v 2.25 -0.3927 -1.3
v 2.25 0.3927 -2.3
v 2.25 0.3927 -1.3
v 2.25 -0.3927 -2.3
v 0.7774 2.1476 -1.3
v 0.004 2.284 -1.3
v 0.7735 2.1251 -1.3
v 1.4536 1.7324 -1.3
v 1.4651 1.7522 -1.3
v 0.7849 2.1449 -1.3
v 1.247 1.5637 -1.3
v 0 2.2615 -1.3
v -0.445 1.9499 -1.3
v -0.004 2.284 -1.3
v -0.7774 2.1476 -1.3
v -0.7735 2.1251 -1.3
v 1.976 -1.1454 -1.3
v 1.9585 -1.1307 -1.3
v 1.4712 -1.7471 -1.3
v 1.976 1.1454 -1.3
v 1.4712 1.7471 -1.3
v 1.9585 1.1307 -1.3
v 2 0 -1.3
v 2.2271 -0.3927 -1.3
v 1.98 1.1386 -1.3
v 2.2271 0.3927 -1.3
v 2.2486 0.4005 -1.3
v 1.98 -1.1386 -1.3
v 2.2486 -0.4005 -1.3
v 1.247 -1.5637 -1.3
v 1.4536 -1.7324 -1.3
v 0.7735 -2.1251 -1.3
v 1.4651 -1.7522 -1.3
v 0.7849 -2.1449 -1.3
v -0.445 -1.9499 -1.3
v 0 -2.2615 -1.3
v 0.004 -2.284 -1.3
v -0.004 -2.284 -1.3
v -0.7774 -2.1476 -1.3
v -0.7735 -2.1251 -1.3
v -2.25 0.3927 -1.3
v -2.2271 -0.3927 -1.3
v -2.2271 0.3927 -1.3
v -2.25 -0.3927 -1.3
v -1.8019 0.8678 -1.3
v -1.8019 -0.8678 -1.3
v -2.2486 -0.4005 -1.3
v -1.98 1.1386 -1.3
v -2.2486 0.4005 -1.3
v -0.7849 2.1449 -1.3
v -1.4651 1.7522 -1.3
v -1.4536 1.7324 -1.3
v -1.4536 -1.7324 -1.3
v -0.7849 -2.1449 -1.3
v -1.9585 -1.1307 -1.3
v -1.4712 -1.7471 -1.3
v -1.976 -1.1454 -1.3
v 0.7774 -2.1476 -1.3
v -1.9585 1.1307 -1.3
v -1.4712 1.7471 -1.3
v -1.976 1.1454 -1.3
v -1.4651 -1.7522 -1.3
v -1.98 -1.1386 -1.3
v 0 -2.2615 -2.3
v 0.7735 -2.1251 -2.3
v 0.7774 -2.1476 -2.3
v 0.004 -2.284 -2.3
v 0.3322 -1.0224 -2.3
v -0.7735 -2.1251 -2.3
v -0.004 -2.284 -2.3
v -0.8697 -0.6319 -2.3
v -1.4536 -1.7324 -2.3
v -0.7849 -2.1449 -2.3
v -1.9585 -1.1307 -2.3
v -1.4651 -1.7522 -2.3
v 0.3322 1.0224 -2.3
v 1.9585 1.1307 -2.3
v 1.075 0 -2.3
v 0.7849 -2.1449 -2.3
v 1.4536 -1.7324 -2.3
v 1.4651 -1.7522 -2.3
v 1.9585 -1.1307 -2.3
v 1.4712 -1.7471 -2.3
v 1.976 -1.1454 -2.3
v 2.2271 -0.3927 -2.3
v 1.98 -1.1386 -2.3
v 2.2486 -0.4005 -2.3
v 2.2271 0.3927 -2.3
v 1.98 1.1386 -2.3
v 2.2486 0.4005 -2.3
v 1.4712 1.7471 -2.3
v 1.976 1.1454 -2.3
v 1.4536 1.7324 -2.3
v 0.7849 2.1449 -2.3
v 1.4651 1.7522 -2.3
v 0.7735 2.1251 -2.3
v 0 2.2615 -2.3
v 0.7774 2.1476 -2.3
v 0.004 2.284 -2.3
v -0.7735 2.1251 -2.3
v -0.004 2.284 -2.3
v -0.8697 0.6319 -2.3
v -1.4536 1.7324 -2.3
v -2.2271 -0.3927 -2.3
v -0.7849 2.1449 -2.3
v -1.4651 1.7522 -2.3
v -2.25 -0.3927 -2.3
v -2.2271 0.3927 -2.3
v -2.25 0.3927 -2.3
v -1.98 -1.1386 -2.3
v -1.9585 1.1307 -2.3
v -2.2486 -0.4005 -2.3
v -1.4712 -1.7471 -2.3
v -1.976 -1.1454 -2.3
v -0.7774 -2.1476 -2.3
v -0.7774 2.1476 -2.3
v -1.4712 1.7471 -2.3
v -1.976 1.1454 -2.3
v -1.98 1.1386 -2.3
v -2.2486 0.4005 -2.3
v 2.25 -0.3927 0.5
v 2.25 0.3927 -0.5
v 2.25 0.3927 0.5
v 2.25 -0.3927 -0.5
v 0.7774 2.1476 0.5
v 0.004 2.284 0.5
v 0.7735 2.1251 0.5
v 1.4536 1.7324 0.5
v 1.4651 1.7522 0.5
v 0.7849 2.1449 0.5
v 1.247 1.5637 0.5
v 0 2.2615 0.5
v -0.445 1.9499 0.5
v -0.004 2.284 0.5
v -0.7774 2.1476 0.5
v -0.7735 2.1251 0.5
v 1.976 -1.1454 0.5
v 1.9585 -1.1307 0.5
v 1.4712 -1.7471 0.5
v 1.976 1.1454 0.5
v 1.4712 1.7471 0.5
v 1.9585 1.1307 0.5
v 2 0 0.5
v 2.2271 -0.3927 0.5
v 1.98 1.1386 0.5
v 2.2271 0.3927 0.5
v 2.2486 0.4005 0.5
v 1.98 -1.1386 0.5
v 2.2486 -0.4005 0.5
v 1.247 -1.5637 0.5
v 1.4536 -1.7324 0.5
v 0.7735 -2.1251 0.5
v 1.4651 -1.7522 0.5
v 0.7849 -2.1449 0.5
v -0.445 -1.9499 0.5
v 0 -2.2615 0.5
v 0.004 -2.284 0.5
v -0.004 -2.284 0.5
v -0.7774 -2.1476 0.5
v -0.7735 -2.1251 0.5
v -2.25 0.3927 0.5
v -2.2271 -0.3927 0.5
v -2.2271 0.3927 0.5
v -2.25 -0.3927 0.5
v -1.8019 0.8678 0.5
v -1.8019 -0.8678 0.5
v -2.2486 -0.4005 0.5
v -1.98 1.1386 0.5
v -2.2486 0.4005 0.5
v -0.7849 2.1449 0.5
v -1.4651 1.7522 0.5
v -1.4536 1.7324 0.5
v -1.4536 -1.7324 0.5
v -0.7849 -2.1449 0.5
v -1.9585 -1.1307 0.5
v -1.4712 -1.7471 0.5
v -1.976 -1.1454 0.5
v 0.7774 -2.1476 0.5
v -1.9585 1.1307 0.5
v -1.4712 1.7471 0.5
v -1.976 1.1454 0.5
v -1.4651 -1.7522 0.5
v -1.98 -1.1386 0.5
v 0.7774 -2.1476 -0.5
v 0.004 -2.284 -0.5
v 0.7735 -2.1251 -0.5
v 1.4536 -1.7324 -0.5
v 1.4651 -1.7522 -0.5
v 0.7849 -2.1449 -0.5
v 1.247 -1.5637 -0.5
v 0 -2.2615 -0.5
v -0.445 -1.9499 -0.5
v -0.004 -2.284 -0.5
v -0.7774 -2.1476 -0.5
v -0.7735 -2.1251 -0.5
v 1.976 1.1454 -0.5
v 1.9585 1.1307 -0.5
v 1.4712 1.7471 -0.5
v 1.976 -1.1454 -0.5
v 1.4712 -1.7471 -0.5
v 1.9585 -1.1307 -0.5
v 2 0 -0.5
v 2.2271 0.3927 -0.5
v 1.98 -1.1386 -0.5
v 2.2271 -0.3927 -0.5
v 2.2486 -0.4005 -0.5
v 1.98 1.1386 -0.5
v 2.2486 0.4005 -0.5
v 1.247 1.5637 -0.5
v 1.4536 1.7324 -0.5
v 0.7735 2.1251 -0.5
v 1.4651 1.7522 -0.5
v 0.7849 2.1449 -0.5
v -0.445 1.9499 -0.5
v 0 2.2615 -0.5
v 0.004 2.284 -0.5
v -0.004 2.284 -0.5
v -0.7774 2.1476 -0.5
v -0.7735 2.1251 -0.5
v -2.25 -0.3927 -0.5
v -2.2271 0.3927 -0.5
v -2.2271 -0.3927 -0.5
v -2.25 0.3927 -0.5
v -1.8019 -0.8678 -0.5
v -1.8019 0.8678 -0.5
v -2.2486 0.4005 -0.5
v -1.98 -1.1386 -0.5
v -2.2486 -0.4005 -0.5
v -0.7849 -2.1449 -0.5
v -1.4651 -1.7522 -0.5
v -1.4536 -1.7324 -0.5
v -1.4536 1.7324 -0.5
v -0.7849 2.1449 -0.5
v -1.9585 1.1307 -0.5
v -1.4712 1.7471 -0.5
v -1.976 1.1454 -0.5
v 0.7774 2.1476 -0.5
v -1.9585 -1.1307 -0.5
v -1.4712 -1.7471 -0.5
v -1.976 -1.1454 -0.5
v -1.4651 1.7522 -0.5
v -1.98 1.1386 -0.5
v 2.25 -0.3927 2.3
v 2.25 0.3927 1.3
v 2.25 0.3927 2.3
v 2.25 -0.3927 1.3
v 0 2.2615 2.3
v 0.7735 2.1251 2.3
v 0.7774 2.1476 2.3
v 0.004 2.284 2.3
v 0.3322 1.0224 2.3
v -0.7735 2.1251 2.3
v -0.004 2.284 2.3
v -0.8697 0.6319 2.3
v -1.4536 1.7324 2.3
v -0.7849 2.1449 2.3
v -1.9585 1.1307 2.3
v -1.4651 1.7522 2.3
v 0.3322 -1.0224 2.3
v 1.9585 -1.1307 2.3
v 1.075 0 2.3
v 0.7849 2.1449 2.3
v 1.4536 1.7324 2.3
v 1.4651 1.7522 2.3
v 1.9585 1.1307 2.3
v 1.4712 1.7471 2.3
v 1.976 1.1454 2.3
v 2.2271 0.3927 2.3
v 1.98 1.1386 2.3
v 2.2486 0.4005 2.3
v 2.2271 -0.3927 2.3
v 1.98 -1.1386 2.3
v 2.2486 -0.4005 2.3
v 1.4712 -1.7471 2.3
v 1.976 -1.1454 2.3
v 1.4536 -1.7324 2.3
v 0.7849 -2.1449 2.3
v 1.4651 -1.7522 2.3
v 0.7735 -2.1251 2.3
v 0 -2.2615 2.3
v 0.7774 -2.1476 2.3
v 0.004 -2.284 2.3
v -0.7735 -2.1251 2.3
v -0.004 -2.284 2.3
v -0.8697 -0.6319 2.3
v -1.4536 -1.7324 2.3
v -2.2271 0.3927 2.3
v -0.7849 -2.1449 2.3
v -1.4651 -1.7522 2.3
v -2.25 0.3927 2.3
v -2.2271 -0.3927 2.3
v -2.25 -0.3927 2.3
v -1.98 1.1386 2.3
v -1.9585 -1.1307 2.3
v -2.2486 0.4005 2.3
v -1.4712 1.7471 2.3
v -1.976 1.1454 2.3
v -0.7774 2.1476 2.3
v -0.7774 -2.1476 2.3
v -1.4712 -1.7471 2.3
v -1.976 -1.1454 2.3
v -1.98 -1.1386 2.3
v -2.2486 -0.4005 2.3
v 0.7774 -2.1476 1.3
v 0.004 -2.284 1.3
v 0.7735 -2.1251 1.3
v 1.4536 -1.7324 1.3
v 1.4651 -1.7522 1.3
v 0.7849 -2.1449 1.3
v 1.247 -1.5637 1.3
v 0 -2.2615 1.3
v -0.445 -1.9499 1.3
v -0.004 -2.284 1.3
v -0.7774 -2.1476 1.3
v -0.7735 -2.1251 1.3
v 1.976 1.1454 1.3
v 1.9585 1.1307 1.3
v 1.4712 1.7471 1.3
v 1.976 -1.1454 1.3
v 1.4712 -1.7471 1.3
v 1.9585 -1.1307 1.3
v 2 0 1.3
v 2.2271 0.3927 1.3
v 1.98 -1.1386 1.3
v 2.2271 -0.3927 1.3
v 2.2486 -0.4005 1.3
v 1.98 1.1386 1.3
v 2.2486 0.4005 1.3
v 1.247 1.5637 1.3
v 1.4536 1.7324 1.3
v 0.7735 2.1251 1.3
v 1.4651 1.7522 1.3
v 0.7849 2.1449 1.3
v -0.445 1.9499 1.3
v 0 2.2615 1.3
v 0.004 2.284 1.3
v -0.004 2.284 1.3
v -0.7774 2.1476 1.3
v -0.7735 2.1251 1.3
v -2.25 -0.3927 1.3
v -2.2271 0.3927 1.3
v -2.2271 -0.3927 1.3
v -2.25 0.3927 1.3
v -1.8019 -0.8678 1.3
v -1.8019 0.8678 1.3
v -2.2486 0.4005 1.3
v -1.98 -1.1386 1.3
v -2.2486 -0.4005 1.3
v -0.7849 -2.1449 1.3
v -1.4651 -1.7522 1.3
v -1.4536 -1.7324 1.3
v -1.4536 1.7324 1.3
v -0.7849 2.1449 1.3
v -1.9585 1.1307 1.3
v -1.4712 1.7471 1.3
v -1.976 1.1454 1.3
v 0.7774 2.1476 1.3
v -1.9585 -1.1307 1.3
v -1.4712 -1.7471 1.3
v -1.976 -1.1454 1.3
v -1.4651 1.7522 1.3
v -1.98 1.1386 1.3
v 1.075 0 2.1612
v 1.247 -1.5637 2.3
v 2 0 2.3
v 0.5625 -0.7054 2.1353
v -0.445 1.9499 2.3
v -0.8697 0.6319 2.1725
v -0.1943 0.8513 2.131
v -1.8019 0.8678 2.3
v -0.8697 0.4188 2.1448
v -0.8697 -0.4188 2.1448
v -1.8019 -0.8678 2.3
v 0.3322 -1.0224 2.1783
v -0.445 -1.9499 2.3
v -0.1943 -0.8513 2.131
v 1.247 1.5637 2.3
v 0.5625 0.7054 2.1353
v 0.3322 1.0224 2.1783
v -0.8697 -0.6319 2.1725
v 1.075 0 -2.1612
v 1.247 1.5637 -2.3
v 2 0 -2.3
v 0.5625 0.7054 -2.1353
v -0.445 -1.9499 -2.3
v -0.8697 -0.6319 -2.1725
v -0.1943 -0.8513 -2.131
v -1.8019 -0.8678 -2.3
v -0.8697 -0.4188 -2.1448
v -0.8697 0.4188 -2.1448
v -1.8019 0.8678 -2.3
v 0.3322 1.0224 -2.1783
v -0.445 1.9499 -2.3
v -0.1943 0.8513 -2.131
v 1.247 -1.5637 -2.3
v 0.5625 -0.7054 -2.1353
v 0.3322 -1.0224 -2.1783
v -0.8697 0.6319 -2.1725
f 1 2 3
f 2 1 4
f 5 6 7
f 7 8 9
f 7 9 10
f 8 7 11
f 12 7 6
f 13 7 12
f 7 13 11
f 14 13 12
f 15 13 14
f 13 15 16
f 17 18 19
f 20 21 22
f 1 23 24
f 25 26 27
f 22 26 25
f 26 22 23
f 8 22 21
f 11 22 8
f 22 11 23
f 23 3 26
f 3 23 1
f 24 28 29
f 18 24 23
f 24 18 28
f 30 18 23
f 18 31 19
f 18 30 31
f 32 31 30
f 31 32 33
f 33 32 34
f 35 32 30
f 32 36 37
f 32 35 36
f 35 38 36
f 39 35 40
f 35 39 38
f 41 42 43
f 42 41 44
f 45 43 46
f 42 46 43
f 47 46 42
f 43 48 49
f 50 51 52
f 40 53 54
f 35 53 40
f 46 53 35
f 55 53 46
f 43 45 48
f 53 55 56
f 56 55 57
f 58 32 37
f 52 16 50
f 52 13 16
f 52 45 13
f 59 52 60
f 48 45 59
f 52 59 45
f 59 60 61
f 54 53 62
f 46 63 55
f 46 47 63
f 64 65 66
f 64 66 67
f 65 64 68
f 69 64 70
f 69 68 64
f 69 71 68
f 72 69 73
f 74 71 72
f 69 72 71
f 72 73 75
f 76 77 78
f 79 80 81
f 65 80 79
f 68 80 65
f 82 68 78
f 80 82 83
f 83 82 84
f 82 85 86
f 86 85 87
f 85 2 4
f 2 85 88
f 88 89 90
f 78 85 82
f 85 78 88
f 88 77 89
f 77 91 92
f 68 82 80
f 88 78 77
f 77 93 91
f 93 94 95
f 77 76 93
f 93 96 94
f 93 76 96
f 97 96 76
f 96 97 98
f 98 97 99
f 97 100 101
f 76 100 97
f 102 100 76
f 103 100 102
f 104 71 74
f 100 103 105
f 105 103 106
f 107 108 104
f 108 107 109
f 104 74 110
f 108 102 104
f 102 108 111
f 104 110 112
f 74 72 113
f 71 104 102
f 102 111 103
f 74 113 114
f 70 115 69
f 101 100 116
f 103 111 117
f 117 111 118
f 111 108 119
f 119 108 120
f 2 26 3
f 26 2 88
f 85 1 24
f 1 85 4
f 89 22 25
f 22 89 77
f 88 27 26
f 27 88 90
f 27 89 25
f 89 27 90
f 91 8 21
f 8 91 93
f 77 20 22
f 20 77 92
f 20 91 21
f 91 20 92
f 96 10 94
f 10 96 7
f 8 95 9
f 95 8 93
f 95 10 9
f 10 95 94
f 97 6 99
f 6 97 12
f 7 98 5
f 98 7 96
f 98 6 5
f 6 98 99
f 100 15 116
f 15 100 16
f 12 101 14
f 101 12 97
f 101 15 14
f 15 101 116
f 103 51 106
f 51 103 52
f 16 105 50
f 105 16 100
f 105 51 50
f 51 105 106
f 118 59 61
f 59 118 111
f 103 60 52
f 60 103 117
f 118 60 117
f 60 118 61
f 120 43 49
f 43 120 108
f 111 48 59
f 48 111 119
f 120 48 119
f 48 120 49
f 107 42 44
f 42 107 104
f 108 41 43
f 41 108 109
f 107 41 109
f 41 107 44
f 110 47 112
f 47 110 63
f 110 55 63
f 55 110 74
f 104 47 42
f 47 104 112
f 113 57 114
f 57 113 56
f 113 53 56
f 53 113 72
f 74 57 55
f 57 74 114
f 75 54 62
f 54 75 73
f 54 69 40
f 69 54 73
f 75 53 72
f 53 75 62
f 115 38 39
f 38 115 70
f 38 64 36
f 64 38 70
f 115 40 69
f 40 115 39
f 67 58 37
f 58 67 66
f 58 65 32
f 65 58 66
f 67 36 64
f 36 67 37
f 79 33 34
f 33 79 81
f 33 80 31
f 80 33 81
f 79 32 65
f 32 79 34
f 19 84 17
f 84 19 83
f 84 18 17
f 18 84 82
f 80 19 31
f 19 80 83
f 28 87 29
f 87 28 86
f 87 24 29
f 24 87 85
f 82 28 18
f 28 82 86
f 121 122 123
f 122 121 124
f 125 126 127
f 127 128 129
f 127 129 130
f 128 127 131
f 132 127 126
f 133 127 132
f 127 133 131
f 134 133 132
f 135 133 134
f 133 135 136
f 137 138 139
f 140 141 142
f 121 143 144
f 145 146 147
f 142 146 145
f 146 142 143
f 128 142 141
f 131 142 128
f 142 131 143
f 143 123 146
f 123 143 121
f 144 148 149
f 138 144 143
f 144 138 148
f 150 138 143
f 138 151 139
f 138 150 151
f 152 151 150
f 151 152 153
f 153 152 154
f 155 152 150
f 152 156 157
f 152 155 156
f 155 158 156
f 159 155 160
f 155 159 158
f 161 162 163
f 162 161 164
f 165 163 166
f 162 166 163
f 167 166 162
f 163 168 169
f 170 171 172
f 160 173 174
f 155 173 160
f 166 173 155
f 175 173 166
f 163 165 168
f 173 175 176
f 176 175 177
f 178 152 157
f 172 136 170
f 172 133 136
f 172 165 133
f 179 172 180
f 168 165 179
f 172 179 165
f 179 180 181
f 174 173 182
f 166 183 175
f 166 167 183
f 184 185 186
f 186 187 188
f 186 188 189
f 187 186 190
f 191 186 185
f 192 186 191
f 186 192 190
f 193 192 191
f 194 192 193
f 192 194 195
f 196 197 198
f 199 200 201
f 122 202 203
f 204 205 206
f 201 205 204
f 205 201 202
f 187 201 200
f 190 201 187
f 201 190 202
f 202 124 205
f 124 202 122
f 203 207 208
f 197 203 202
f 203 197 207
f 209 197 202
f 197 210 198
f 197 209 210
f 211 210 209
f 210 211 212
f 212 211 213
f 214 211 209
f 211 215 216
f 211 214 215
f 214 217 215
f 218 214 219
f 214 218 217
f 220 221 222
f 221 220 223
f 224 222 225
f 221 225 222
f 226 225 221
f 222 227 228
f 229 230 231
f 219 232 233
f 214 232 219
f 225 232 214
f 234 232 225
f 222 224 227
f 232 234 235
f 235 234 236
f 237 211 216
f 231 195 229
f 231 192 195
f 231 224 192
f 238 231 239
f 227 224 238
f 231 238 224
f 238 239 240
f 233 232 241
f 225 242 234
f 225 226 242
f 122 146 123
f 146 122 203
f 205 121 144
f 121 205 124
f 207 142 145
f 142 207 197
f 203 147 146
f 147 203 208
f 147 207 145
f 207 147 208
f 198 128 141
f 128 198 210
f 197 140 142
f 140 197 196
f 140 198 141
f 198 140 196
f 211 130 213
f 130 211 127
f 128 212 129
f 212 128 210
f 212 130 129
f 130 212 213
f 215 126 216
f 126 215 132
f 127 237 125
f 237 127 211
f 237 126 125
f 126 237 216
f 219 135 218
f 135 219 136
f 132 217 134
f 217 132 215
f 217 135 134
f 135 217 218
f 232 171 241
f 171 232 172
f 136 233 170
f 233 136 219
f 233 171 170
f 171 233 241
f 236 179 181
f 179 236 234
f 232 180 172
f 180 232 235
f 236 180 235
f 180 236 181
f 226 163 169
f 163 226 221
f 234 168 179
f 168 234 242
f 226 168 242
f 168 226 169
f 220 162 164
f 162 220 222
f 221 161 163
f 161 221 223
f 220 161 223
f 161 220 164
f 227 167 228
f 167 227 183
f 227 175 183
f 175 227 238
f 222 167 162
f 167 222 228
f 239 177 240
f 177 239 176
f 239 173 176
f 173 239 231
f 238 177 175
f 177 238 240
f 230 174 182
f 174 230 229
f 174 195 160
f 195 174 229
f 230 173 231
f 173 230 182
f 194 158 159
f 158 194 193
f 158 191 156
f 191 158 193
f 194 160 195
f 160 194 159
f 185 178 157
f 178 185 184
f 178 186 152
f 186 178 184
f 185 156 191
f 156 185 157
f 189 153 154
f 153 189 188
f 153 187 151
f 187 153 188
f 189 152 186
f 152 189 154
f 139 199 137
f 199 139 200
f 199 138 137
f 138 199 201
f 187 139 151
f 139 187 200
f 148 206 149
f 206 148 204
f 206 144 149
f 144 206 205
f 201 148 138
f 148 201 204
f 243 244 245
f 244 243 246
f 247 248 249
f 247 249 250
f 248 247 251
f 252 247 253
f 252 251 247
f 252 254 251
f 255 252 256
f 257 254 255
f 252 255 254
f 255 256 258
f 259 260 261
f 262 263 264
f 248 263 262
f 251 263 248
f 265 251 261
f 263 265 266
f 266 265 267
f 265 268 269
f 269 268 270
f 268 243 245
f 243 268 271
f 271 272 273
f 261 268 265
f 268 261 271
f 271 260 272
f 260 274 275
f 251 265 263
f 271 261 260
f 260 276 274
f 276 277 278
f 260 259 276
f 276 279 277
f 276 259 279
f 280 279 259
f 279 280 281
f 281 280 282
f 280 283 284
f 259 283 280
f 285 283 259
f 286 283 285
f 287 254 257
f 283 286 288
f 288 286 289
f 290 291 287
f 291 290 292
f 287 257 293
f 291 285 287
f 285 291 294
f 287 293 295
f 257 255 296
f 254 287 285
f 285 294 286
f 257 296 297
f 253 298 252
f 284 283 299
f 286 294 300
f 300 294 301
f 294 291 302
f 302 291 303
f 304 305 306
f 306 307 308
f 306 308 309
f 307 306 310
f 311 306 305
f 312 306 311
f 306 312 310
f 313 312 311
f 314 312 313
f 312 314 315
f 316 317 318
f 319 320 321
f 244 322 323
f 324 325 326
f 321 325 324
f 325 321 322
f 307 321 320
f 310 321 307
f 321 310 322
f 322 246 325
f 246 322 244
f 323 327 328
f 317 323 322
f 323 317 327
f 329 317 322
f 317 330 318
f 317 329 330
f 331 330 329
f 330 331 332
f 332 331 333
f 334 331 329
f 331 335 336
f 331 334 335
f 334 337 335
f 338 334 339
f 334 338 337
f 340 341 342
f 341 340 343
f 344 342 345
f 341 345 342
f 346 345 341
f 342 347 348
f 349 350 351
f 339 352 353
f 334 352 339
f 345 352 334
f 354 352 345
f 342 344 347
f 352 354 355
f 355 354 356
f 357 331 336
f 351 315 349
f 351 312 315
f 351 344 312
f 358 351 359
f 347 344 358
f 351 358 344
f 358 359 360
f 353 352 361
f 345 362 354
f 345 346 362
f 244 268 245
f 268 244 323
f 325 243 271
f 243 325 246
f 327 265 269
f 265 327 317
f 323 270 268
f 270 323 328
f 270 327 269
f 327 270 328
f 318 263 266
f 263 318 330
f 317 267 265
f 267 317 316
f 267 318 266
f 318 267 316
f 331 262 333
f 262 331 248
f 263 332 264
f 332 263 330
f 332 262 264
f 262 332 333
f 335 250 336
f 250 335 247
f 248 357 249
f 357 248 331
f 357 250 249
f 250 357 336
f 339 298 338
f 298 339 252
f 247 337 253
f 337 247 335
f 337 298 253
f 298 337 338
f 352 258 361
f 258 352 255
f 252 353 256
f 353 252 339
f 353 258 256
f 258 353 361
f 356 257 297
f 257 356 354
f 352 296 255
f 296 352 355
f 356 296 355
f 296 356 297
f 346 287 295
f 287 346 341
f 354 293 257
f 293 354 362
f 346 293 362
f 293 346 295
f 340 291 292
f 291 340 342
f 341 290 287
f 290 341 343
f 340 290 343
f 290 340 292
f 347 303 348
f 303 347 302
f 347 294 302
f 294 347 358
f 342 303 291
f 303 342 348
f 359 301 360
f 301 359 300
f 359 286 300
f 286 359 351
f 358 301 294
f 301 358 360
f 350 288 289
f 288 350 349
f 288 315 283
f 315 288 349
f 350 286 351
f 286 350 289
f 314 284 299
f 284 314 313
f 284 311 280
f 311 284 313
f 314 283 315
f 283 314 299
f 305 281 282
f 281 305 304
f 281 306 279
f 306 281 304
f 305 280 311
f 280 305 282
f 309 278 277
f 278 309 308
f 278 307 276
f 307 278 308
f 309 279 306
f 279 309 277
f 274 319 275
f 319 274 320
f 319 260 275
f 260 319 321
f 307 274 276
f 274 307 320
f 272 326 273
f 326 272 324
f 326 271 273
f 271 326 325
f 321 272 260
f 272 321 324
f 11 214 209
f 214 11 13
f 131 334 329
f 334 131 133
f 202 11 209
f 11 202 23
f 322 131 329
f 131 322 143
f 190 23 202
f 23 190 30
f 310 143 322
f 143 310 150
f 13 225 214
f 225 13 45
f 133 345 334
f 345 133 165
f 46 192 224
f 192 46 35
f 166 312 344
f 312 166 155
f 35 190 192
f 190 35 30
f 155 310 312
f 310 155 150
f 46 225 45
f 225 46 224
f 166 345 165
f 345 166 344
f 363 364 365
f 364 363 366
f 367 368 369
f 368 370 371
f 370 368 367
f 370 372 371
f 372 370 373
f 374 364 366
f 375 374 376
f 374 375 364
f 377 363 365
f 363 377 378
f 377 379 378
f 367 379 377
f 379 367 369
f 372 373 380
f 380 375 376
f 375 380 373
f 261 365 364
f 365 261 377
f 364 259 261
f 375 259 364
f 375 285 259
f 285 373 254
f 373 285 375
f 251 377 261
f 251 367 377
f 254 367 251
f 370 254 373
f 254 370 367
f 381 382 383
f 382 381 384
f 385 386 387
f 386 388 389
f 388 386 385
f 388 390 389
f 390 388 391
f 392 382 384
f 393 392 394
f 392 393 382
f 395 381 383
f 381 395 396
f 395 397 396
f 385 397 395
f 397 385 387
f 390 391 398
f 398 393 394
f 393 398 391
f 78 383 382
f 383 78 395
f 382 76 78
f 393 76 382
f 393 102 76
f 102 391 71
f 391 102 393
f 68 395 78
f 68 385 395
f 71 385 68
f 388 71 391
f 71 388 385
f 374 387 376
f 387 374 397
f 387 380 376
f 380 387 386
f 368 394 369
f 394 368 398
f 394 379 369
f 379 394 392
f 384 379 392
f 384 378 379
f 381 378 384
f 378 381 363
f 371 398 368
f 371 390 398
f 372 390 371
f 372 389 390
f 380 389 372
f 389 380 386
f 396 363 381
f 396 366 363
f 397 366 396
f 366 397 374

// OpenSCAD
// Parameters
outer_diameter_mm = 4; //[2:8:0.1]
length_mm = 4.6; //[2.3:9.2:0.1]
screw_nominal_diameter_mm = 2.5; //[1.2:5:0.1]
internal_thread_pitch_mm = 0.45; //[0.2:0.9:0.01]
internal_minor_diameter_mm = 2.05; //[1.02:4.1:0.01]
internal_major_diameter_mm = 2.5; //[1.25:5:0.01]
internal_thread_length_mm = 4.2; //[2.1:8.4:0.1]
end_chamfer_mm = 0.3; //[0.15:0.6:0.05]
knurl_depth_mm = 0.25; //[0.1:0.5:0.01]
knurl_band_count = 3; //[1:8:1]
knurl_band_height_mm = 1; //[0.5:2:0.05]
center_bore_allowance_mm = 0.1; //[0:0.3:0.01]
overlap_mm = 0.8; //[0.5:2:0.1]
knurl_tooth_count = 18; //[8:40:1]

// Threaded Insert - complete geometry
module threaded_insert() {
  color([0.8, 0.6, 0.2]) { // Brass color
    difference() {
      union() {
        // Insert body
        cylinder(h=length_mm, r=outer_diameter_mm/2, center=true);
        
        // Knurl bands
        for (i = [-1, 0, 1]) {
          translate([0, 0, i * (knurl_band_height_mm + overlap_mm)]) {
            union() {
              // Knurl band core
              cylinder(h=knurl_band_height_mm, r=outer_diameter_mm/2 + knurl_depth_mm, center=true);
              
              // Knurl teeth
              for (j = [0:knurl_tooth_count-1]) {
                rotate([0, 0, j * 360/knurl_tooth_count]) {
                  translate([(outer_diameter_mm/2 + knurl_depth_mm) - (knurl_depth_mm + overlap_mm)/2, 0, 0]) {
                    cube([knurl_depth_mm + overlap_mm, (2*3.141592653589793*(outer_diameter_mm/2 + knurl_depth_mm))/knurl_tooth_count, knurl_band_height_mm], center=true);
                  }
                }
              }
            }
          }
        }
      }
      
      // Lead-in chamfers
      translate([0, 0, length_mm/2 - end_chamfer_mm/2]) rotate([180, 0, 0]) 
        cylinder(h=end_chamfer_mm, r1=outer_diameter_mm/2, r2=0, center=true);
      translate([0, 0, -length_mm/2 + end_chamfer_mm/2]) 
        cylinder(h=end_chamfer_mm, r1=outer_diameter_mm/2, r2=0, center=true);
      
      // Internal thread or clearance bore
      cylinder(h=internal_thread_length_mm + 2*overlap_mm, r=(internal_minor_diameter_mm + center_bore_allowance_mm)/2, center=true);
    }
  }
}

// Assembly
module assembly() {
  threaded_insert();
}

assembly();
